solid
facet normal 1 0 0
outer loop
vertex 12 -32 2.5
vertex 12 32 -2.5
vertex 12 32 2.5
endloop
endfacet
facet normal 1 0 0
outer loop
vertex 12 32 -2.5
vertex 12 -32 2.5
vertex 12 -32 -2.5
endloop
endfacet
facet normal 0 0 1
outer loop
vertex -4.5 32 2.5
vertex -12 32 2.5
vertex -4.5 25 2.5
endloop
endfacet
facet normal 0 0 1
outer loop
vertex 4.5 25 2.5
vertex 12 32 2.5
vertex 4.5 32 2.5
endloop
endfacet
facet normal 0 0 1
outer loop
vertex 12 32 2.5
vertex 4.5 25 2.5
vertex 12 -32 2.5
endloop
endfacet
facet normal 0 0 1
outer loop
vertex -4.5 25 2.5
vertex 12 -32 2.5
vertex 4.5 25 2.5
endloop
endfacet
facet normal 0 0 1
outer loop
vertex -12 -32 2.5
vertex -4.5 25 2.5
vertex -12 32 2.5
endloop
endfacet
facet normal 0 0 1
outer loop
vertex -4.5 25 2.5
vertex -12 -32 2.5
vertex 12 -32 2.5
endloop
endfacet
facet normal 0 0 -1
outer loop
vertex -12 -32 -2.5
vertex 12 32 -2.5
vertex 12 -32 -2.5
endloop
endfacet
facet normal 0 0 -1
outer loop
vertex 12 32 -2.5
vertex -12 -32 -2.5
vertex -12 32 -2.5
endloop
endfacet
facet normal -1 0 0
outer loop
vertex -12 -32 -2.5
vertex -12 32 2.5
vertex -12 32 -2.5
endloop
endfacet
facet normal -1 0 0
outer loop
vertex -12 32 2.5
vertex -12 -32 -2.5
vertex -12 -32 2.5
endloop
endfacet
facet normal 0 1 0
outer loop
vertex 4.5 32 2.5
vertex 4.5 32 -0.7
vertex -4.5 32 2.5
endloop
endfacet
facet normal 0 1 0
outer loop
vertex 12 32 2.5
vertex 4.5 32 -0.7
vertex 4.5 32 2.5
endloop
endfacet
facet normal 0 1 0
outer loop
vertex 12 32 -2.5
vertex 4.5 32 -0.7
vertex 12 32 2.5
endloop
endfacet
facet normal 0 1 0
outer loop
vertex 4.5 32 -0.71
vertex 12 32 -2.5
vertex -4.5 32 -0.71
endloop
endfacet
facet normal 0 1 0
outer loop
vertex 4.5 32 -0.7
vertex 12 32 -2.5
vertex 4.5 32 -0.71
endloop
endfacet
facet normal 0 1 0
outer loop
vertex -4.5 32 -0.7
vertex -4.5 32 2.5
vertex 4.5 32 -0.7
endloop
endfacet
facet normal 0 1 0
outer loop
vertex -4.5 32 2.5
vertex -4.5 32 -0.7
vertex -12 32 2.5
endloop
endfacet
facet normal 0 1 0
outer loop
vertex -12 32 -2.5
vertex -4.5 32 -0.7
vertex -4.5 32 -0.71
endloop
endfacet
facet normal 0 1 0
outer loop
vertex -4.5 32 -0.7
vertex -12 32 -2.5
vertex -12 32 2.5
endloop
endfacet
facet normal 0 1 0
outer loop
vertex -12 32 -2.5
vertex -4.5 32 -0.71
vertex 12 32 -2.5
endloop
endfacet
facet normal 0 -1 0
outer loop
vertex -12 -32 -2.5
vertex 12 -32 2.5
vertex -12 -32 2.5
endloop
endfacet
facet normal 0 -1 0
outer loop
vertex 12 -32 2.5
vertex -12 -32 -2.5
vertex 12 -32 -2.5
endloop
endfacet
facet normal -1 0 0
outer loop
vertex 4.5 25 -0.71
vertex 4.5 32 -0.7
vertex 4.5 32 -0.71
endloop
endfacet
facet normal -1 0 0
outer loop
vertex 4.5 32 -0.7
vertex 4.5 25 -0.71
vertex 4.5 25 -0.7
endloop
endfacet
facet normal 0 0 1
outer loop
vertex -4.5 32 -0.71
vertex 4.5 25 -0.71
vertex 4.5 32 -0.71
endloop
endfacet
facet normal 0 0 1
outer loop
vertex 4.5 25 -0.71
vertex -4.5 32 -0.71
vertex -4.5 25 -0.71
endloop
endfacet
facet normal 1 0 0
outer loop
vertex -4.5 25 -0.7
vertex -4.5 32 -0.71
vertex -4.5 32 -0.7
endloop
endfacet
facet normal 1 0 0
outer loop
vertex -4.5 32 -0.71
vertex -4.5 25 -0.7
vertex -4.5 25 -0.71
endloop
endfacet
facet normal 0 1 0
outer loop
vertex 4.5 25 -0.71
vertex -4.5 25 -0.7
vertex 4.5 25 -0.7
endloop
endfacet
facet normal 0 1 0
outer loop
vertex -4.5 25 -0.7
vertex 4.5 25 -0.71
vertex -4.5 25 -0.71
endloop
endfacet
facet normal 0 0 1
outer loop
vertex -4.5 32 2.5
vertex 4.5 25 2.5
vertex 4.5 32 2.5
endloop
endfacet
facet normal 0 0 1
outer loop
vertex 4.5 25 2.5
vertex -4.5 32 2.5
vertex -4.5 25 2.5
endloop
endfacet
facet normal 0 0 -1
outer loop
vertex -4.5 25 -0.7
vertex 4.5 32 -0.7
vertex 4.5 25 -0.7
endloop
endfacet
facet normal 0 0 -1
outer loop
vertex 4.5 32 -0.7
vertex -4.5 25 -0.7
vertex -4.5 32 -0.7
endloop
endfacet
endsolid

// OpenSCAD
// file: dimensions.scad
//
// Shared component and stack dimensions
// Units: mm
// Legend:
// - L: Length
// - W: Width
// - T: Thickness
//

// Load cell
lc_L = 80;
lc_W = 40;
lc_T = 4;
loadcell_lift = 4; // support structure height under load cell (from enclosure floor)

eye_d = 17;
eye_edge_start = 6;
eye_center_offset = eye_edge_start + eye_d / 2;

notch_d = 6;
notch_xA = 20;
notch_xB = 60;

// Battery
bat_L = 50;
bat_W = 34;
bat_T = 10;

// PCB
pcb_L = 64;
pcb_W = 24;
pcb_T = 5;

// USB-C connector envelope
usb_w = 9;
usb_h = 3.2;
usb_d = 7;
usb_inset = 3.2;

// LED placement on PCB
led_from_left = 5;
led_from_usb_side = 15;

// Stack spacing
loadcell_to_battery_gap = 2;
battery_to_pcb_gap = 0;
battery_rear_gap = 0.2; // target battery rear-edge gap to enclosure inner rear wall

// Inner cavity clearances
clear_x = 0.8;
rear_clear = 0.8;
front_clear = 2.0;
top_clear = 0.8; // small PCB-to-lid gap; pcb_T already includes LED thickness
pcb_front_gap = 0.2; // target PCB front-edge gap to USB-side inner wall

// Side switch (KCD11 10x15 mm)
switch_w = 15;
switch_d = 13;
switch_h = 10;
switch_rot_y = 0;
switch_clear = 0.4;

// Screw centers from outer walls (shared by main and lid).
// 5.25 mm makes main screw posts merge into side walls for higher strength.
screw_corner_inset = 5.25;
// main file
//
// PCB model with USB-C connector
// Units: mm
//

include <dimensions.scad>

$fn = 64;

// LED envelope (visual only, not shared board dimensions)
led_w = 1.6;
led_l = 0.8;
led_h = 0.8;
led_rot_z = 90;

module pcb_model(show_usb=true) {
    assert(usb_inset >= 0 && usb_inset <= pcb_T, "usb_inset must be between 0 and pcb_T");
    assert(led_h <= pcb_T, "led_h must fit within pcb_T (PCB thickness already includes LED)");

    usb_x = 0;
    usb_y = pcb_L/2 - usb_d/2;               // flush to PCB edge (no overhang)
    usb_z = pcb_T/2 + usb_h/2 - usb_inset;   // recessed into PCB by usb_inset

    pcb_usb_pocket_z = pcb_T/2 - usb_inset/2;
    led_x = pcb_W/2 - led_from_left;
    led_y = pcb_L/2 - led_from_usb_side;
    // LED is embedded in the PCB thickness (must not protrude above the PCB top face).
    led_z = pcb_T/2 - led_h/2;

    union() {

        // PCB body (centered)
        color("green")
            difference() {
                cube([pcb_W, pcb_L, pcb_T], center=true);

                if (show_usb && usb_inset > 0) {
                    translate([usb_x, usb_y, pcb_usb_pocket_z])
                        cube([usb_w, usb_d, usb_inset + 0.02], center=true);
                }
            }

        // USB-C connector block
        if (show_usb) {
            translate([
                usb_x,
                usb_y,
                usb_z
            ])
            color("silver")
                cube([usb_w, usb_d, usb_h], center=true);
        }

        // LED envelope embedded within the PCB thickness.
        translate([led_x, led_y, led_z])
            color("yellow")
                rotate([0, 0, led_rot_z])
                    cube([led_w, led_l, led_h], center = true);
    }
}

// Render PCB
pcb_model();
